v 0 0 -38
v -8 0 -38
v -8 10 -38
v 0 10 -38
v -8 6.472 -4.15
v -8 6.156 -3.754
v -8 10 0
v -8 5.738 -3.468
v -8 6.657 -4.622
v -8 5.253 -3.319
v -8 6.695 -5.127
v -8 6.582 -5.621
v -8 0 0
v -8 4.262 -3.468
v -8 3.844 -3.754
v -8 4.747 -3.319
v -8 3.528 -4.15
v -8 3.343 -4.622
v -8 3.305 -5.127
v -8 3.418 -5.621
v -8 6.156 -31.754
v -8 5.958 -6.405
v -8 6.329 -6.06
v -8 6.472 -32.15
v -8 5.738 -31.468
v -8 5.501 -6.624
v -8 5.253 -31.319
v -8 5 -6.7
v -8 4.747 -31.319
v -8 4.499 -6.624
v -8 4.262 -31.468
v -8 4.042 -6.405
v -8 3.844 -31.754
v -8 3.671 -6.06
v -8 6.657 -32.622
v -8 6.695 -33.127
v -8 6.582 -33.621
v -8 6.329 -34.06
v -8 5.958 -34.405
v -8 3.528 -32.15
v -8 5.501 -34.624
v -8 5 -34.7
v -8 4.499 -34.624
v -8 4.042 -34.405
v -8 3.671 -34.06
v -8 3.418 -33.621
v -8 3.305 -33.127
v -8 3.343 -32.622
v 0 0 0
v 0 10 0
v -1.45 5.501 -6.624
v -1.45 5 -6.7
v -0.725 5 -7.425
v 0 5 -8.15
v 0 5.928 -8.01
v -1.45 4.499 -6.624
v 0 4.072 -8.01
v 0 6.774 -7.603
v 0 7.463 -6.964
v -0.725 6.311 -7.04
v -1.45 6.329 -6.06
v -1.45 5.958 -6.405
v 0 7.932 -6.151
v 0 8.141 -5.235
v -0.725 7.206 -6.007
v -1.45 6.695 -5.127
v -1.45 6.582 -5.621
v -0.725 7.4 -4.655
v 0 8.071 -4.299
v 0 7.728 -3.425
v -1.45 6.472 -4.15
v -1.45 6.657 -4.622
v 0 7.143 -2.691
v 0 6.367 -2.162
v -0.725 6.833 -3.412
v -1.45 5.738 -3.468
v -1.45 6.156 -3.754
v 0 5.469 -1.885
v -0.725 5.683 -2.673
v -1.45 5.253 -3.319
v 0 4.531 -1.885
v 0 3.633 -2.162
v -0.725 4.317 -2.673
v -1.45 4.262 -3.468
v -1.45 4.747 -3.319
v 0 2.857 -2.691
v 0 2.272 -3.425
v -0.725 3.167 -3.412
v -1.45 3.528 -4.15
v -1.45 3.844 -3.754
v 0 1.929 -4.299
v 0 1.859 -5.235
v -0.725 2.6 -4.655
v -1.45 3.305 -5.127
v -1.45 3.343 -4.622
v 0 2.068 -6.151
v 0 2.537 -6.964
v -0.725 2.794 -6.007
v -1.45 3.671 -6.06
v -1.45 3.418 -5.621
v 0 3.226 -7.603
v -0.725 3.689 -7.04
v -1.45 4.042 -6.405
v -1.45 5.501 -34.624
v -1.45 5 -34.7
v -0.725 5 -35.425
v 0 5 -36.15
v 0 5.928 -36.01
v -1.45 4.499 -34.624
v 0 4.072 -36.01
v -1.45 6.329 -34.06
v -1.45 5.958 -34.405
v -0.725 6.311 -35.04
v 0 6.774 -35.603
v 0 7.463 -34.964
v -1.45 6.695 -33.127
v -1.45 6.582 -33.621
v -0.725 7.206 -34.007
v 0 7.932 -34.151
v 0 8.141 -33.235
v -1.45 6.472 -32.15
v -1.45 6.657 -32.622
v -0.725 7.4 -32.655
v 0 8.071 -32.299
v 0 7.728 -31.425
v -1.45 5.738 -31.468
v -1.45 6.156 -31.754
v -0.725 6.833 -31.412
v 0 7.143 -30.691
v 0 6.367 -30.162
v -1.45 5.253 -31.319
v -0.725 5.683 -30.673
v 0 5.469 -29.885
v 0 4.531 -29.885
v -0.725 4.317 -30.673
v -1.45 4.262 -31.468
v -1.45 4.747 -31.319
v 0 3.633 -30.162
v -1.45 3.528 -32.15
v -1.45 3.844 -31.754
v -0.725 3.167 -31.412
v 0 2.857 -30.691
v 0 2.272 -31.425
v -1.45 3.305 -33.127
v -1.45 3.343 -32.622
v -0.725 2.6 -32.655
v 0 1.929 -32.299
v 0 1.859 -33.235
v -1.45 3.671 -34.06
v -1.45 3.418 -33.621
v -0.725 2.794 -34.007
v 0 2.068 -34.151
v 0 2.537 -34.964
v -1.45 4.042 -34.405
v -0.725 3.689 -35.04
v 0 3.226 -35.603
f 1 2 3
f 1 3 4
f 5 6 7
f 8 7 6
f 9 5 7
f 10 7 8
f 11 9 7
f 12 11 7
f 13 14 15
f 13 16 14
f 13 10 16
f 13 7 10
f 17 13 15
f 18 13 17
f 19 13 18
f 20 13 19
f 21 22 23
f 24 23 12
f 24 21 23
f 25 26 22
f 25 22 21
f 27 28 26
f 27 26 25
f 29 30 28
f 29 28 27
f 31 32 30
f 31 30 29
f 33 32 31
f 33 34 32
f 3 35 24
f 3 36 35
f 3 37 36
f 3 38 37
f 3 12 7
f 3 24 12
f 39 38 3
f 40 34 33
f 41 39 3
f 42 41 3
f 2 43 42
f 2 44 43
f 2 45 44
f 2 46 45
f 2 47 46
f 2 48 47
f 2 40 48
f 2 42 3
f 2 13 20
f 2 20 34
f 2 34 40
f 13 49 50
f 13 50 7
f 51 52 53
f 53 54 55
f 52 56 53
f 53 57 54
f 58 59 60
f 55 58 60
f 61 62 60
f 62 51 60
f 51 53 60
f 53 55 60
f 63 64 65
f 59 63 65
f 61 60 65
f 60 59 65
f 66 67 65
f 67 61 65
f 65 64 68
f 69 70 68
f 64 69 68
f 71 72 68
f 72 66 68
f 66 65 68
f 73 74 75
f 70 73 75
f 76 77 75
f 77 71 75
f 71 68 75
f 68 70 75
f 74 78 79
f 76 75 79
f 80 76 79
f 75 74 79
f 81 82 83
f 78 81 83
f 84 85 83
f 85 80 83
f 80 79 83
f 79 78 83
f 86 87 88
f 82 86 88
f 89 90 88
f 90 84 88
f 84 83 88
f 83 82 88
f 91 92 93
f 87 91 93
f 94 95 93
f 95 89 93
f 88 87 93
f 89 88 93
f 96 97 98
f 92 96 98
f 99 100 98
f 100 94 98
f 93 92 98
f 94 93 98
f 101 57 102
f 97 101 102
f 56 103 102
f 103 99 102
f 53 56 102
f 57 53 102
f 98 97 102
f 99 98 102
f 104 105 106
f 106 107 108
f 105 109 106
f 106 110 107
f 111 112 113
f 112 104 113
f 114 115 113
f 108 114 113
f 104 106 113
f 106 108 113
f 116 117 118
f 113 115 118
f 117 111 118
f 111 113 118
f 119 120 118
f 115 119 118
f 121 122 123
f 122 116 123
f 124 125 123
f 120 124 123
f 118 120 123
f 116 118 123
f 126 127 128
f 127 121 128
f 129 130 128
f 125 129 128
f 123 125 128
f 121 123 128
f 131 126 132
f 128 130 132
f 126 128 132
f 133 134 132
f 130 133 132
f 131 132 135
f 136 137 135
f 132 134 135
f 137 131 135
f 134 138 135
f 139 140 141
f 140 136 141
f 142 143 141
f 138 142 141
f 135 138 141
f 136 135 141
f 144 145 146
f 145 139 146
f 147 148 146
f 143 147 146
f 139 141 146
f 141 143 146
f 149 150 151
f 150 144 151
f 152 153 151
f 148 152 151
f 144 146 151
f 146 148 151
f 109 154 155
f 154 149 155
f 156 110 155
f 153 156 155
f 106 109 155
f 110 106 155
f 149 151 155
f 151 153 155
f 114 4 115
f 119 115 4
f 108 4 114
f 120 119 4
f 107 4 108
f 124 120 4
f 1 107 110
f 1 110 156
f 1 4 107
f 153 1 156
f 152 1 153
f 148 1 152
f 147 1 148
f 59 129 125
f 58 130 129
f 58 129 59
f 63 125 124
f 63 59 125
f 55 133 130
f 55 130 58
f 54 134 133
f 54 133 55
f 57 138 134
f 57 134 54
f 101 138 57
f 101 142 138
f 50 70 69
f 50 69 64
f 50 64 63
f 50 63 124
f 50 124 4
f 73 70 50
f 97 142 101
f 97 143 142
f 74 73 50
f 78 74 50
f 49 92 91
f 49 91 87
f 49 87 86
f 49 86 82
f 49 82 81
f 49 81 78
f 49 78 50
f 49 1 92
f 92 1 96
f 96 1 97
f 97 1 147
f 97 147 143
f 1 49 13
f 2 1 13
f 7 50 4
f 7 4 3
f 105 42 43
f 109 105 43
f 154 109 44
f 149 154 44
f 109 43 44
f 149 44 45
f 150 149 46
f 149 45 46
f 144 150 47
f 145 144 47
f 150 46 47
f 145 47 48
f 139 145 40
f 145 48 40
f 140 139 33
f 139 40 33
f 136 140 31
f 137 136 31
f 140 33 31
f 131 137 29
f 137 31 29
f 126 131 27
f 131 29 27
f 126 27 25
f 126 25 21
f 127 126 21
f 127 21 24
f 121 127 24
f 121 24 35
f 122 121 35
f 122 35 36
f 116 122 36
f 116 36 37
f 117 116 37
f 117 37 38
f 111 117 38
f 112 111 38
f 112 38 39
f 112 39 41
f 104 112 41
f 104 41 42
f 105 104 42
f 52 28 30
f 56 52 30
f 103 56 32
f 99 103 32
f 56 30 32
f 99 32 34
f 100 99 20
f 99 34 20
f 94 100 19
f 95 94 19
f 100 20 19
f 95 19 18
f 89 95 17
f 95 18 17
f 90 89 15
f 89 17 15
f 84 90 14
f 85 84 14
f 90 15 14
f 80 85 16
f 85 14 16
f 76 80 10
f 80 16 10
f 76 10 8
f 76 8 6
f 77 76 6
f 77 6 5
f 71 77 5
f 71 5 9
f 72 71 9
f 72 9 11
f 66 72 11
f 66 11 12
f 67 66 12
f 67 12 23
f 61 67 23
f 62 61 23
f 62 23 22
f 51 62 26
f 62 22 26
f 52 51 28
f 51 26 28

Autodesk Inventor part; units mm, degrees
ref_plane "YZ Plane" through (0, 0, 0) normal (1, 0, 0) x (0, 1, 0)
ref_plane "XZ Plane" through (0, 0, 0) normal (0, 1, 0) x (-1, 0, 0)
ref_plane "XY Plane" through (0, 0, 0) normal (0, 0, 1) x (1, 0, 0)
sketch "Sketch1" plane through (0, 0, 0) normal (0, 1, 0) x (-1, 0, 0)
  line L0 (0, 0) -> (8, 0)
  line L1 (8, 0) -> (8, -38)
  line L2 (8, -38) -> (0, -38)
  line L3 (0, -38) -> (0, 0)
  dimension "d0" = 38
  dimension "d1" = 8
extrude "Extrusion1" add sketch "Sketch1" along normal blind 10
sketch "Sketch2" plane through (0, 0, 0) normal (1, 0, 0) x (0, 0, -1)
  line L0 (0, 0) -> (0, 10) projected
  line L1 (38, 0) -> (38, 10) projected
  point P0 (5, 5)
  point P1 (33, 5)
  point P2 (38, 5)
  dimension "d4" = 5
  dimension "d5" = 5
hole "Hole1" at (0, 5, -5) at (0, 5, -33) direction (-1, 0, 0) diameter 3.4 end through all countersink diameter 6.3 countersink angle 90 clearance for "Flat Head Machine Screw" size "M3" standard "Ansi Metric M Profile"
properties part number "Top_End Sponge" material "Rubber, Silicone"
